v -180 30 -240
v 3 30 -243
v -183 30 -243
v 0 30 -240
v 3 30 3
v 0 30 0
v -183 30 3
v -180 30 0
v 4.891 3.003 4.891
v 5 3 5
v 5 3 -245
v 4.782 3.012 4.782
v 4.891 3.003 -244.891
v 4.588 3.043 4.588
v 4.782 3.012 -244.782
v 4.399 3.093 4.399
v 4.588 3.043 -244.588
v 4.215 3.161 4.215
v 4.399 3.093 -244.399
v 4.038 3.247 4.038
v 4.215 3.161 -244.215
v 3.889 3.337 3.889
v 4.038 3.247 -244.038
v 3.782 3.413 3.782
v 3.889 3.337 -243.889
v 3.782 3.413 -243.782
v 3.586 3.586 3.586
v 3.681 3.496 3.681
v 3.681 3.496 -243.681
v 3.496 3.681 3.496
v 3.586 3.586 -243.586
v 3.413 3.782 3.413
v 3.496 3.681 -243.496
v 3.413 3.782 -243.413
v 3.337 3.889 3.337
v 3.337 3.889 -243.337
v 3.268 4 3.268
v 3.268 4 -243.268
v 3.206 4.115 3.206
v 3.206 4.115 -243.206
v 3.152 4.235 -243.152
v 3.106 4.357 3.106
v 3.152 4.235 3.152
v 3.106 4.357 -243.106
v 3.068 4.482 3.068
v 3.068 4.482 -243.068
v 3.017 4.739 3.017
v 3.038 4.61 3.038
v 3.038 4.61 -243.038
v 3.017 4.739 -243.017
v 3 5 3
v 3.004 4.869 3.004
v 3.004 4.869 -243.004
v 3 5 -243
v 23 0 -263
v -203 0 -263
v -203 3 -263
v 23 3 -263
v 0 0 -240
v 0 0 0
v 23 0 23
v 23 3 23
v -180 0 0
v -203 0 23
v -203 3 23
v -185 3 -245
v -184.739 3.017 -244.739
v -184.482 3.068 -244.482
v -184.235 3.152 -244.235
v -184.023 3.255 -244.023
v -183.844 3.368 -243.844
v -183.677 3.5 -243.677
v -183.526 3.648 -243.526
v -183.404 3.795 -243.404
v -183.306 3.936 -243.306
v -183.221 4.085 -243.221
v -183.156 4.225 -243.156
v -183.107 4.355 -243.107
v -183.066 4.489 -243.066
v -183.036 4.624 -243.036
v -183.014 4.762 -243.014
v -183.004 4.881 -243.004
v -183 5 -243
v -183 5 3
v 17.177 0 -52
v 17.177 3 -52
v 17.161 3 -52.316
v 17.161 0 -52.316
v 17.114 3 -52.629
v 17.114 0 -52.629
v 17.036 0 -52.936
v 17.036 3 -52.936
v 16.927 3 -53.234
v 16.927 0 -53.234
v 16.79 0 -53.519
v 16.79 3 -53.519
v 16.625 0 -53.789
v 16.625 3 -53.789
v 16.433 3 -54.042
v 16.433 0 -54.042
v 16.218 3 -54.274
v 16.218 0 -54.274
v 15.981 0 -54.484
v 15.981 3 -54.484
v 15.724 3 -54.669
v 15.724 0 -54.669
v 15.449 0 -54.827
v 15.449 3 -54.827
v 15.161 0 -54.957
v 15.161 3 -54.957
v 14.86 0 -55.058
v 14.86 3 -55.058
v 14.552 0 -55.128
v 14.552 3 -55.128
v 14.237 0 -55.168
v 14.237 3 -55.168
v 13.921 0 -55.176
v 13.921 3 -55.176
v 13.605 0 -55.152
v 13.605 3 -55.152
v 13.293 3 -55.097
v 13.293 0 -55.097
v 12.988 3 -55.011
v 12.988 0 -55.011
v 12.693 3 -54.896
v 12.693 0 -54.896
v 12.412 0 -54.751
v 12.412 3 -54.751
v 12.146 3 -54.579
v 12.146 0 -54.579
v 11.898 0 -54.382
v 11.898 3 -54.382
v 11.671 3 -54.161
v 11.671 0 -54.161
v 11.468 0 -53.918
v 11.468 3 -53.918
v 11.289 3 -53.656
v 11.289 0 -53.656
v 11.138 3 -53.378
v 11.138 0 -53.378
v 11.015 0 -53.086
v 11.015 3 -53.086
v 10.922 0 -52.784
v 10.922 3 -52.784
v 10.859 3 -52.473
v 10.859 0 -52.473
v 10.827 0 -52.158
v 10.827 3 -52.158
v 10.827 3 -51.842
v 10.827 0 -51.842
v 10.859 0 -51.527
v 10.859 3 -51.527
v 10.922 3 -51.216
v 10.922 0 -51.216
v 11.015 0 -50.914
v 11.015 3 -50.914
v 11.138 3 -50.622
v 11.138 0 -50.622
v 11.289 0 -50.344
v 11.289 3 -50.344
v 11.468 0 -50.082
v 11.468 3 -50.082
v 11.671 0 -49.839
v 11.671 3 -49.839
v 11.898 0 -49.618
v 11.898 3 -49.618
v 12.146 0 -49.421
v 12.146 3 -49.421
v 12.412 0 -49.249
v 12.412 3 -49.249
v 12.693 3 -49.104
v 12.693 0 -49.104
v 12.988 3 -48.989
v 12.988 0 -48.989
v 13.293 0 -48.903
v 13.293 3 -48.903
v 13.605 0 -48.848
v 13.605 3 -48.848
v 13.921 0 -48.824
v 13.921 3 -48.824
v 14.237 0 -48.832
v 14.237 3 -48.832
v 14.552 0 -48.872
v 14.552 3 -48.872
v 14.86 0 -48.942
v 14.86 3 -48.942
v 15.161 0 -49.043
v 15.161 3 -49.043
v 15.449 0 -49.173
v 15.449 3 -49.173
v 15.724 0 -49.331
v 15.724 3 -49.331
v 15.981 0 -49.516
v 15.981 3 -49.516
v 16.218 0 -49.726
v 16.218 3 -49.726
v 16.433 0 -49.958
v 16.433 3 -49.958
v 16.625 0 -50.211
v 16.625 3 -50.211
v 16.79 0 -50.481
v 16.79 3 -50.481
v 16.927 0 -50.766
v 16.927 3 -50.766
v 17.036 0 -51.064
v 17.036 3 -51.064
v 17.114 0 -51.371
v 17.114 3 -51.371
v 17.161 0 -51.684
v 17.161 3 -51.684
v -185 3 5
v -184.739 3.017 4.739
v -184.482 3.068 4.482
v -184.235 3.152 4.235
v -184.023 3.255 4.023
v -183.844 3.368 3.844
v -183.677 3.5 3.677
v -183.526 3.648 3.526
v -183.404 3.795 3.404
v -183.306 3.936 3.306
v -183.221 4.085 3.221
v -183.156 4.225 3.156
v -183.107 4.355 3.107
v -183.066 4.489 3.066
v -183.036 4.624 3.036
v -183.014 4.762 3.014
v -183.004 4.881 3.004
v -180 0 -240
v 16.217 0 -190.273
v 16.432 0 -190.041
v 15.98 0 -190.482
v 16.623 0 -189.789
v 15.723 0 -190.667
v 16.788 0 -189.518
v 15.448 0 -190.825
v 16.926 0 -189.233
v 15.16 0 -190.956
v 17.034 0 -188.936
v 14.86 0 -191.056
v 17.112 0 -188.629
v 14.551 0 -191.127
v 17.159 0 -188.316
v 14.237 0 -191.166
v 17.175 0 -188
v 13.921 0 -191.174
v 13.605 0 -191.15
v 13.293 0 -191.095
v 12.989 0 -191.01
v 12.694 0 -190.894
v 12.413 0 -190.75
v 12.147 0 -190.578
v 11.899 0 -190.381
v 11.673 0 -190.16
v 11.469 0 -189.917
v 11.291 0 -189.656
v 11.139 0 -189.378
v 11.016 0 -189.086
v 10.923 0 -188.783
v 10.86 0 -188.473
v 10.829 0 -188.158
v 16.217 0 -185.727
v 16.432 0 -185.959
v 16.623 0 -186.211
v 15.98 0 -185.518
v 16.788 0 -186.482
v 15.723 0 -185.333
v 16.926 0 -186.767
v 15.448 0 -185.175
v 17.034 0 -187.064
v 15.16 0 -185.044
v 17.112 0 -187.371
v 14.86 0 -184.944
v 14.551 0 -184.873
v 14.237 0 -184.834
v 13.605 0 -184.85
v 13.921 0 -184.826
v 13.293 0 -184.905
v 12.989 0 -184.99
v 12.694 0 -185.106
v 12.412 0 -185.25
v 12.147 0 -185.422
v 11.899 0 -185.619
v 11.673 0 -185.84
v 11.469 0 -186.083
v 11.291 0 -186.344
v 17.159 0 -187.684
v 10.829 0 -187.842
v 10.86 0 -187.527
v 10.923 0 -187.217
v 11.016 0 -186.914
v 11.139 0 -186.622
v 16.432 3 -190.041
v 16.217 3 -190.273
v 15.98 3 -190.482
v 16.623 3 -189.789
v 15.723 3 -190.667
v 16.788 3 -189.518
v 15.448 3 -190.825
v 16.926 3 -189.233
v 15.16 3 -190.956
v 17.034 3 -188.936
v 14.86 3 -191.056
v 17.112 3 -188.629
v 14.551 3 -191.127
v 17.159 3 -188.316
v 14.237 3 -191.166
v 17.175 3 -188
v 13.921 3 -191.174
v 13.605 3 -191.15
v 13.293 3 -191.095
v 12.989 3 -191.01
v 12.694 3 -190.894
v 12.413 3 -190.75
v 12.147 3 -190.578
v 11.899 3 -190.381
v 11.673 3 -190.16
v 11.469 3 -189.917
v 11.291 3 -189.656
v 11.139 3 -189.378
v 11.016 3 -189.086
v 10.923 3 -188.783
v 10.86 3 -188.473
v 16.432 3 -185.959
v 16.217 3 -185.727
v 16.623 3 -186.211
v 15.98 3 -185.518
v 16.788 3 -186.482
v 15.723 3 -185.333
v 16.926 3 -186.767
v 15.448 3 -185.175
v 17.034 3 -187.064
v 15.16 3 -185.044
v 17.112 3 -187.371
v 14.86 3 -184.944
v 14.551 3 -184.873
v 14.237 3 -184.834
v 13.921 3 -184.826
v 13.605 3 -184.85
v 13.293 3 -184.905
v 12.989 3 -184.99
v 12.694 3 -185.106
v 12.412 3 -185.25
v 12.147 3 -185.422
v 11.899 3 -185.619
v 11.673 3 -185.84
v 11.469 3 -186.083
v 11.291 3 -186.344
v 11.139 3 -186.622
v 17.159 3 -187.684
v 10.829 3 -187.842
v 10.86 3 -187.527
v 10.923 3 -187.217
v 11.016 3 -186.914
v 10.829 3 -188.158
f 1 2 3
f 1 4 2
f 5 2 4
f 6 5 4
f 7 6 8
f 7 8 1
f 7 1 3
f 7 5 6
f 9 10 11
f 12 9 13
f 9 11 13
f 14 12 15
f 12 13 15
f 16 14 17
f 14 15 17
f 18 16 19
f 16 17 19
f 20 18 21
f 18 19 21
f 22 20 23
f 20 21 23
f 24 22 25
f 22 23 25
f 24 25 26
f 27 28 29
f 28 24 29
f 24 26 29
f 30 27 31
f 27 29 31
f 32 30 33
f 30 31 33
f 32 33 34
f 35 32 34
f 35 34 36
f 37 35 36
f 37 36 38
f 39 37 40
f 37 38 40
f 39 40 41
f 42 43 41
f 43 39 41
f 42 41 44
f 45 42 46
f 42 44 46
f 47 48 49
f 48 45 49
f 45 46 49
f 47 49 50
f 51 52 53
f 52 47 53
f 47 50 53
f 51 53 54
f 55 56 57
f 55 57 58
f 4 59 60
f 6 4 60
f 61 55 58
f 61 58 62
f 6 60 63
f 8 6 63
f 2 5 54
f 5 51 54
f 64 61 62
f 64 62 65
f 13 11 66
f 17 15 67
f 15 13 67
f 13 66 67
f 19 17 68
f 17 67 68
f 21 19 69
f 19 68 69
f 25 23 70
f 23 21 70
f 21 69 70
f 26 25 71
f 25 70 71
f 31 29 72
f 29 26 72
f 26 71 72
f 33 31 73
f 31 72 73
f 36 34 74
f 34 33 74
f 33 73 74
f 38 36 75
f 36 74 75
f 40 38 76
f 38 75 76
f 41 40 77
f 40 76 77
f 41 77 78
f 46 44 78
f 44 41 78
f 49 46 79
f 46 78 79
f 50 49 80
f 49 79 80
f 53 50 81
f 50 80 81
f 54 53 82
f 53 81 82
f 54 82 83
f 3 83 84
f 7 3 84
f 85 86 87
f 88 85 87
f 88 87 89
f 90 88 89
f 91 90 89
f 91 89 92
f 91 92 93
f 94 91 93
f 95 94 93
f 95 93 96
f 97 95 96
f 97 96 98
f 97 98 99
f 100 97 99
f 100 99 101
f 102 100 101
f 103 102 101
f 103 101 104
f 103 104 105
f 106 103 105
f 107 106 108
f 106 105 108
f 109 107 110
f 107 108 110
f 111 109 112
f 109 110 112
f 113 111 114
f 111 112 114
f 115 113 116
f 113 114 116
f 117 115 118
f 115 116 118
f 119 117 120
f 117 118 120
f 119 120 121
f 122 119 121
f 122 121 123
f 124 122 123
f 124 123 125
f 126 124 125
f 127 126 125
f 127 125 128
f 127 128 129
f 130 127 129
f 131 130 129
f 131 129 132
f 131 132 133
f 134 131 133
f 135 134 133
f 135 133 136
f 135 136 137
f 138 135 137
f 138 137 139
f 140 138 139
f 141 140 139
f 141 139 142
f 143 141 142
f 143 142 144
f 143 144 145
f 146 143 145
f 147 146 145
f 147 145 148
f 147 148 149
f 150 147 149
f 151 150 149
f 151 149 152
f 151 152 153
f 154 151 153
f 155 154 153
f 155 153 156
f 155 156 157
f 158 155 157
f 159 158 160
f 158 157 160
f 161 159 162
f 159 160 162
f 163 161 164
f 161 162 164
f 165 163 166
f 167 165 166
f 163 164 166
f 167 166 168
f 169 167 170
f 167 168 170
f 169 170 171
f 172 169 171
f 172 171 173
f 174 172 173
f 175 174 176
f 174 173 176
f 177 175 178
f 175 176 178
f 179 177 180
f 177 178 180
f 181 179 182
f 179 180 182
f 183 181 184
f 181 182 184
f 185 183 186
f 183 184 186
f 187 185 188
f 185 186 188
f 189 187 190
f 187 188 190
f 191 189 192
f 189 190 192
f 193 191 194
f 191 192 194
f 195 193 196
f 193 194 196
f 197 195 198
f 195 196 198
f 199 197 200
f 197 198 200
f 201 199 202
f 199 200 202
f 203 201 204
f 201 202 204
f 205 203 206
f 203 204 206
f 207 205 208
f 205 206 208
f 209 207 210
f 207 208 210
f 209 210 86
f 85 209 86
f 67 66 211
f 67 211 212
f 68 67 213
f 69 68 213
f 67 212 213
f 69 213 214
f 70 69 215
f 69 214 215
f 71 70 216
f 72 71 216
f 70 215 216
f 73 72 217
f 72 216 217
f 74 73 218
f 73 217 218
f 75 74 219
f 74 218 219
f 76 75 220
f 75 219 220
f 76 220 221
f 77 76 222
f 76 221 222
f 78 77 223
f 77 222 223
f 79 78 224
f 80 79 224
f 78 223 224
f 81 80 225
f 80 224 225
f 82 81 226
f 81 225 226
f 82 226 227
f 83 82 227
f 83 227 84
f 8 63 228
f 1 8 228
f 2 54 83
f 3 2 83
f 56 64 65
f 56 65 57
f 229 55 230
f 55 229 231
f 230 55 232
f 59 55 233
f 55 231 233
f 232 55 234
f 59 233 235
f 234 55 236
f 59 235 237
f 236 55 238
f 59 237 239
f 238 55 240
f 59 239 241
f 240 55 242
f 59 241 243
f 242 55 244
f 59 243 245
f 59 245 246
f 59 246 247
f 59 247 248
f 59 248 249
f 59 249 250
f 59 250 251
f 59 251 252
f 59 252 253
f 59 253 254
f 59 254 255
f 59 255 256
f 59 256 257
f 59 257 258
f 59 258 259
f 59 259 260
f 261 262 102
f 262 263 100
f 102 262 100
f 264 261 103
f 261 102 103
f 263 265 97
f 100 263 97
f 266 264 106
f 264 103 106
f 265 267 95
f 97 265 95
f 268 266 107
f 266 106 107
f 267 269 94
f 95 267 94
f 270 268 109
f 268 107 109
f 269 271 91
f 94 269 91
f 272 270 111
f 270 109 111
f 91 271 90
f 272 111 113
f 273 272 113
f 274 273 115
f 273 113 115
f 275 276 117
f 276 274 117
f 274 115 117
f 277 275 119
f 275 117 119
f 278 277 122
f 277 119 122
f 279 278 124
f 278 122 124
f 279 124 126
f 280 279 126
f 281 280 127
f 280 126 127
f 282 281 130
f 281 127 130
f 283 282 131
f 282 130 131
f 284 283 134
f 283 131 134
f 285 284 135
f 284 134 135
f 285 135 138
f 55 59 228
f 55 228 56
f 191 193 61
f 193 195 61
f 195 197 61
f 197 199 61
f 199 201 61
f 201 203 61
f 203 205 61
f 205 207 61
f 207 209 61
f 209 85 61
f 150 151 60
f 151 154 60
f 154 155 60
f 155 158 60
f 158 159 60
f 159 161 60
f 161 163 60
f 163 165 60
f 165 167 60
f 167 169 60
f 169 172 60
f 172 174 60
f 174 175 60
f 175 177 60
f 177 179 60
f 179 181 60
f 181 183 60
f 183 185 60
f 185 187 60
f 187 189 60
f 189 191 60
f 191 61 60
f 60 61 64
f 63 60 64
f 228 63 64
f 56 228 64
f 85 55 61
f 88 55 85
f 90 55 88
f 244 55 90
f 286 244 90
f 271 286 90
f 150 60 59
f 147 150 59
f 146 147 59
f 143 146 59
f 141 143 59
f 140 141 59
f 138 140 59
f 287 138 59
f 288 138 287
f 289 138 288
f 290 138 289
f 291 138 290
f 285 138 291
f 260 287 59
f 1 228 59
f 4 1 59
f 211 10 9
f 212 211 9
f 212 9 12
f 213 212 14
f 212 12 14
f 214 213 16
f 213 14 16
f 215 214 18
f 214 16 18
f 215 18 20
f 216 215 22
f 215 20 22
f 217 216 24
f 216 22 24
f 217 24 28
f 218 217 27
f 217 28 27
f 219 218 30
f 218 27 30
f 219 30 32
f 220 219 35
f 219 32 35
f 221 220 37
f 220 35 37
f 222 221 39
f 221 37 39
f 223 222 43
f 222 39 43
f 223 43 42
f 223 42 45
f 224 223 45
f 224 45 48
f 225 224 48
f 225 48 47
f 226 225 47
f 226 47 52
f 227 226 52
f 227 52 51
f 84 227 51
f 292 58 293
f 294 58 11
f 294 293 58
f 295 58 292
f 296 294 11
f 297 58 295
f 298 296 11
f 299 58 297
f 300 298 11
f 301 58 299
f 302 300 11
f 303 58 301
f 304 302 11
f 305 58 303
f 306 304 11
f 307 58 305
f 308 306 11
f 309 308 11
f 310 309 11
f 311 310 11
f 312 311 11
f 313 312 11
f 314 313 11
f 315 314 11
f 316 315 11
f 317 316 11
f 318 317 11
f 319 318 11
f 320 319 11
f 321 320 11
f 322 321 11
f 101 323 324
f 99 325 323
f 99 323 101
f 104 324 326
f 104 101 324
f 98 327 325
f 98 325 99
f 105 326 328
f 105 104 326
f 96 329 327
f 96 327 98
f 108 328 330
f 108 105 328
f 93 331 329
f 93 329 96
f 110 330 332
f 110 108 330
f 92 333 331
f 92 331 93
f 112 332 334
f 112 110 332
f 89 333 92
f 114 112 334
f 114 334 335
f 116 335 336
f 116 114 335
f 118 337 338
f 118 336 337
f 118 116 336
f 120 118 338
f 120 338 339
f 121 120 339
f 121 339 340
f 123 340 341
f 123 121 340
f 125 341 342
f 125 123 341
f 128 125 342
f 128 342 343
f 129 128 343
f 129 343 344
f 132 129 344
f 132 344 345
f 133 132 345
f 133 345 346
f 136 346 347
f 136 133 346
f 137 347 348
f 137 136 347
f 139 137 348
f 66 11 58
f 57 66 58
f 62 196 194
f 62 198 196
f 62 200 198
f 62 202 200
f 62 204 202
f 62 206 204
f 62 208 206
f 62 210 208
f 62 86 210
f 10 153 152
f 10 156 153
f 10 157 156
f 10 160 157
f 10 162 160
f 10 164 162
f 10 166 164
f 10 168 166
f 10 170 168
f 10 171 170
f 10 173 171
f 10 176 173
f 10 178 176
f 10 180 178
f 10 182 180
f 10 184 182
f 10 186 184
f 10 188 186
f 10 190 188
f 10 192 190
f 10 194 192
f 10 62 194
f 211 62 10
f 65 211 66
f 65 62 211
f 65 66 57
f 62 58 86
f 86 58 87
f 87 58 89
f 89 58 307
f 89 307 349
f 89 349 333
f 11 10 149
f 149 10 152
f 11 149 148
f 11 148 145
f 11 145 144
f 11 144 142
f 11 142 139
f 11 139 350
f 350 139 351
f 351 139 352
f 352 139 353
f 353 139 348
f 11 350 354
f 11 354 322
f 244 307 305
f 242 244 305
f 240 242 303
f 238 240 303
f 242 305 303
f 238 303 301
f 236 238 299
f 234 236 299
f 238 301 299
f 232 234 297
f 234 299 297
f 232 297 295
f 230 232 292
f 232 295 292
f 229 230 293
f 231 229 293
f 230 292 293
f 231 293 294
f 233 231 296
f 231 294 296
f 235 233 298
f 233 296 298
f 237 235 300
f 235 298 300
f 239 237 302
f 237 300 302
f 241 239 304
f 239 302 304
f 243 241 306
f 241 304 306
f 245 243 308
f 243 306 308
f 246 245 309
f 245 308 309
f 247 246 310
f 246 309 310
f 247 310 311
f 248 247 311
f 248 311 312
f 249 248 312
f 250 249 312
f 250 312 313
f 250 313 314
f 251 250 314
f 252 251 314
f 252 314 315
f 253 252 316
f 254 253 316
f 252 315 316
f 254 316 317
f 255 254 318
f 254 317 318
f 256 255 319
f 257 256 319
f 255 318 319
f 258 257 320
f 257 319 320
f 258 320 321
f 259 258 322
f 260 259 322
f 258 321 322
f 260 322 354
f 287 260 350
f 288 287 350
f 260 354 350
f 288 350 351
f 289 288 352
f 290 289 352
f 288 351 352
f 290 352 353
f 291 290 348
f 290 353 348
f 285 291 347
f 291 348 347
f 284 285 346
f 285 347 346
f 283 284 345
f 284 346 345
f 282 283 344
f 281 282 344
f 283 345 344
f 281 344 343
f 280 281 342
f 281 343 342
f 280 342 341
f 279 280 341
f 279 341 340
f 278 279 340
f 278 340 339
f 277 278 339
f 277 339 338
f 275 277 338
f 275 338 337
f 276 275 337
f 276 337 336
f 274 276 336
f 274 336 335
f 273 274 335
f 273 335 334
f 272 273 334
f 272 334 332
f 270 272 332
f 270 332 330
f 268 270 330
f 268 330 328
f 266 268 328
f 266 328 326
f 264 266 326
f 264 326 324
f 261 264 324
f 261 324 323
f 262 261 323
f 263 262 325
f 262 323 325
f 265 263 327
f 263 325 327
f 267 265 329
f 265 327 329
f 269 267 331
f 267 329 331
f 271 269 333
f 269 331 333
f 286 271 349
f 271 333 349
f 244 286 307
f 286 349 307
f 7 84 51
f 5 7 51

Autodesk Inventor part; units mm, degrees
ref_plane "YZ Plane" through (0, 0, 0) normal (1, 0, 0) x (0, 1, 0)
ref_plane "XZ Plane" through (0, 0, 0) normal (0, 1, 0) x (-1, 0, 0)
ref_plane "XY Plane" through (0, 0, 0) normal (0, 0, 1) x (1, 0, 0)
sketch "Boceto1" plane through (0, 0, 0) normal (0, 1, 0) x (-1, 0, 0)
  line L0 (0, 0) -> (180, 0)
  line L1 (180, 0) -> (180, -240)
  line L2 (180, -240) -> (0, -240)
  line L3 (0, -240) -> (0, 0)
  line L4 (-3, -243) -> (183, -243)
  line L5 (183, -243) -> (183, 3)
  line L6 (183, 3) -> (-3, 3)
  line L7 (-3, 3) -> (-3, -243)
  line L8 (203, 23) -> (203, -263)
  line L9 (203, -263) -> (-23, -263)
  line L10 (-23, -263) -> (-23, 23)
  line L11 (-23, 23) -> (203, 23)
  dimension "d0" = 180
  dimension "d1" = 240
  dimension "d2" = 3
  dimension "d5" = 20
extrude "Extrusión2" add sketch "Boceto1" along normal blind 30 contours L7 L6 L5 L4
extrude "Extrusión3" add sketch "Boceto1" along normal blind 3 contours L8 L9 L10 L11
fillet "Empalme1" radius 2 4 edges at (3, 3, -120) (-90, 3, 3) (-90, 3, -243) (-183, 3, -120)
sketch "Boceto3" plane through (0, 3, 0) normal (0, 1, 0) x (1, 0, 0)
  line L0 (23, -23) -> (23, 263) projected
  line L1 (23, 263) -> (-203, 263) projected
  line L2 (-203, 263) -> (-203, -23) projected
  line L3 (-203, -23) -> (23, -23) projected
  line L4 (-185, -5) -> (5, -5) projected
  line L5 (-185, 245) -> (-185, -5) projected
  line L6 (5, 245) -> (-185, 245) projected
  line L7 (5, -5) -> (5, 245) projected
  line L8 (-203, 263) -> (-203, -23) projected
  line L9 (-203, -23) -> (-203, 2)
  line L10 (-185, 245) -> (-185, -5) projected
  line L11 (-203, 2) -> (-185, 2)
  line L12 (-185, 2) -> (-185, 52)
  line L13 (-185, 52) -> (-203, 52)
  line L14 (-203, 52) -> (-203, 2)
  line L15 (-183, 243) -> (-183, -3) projected
  line L16 (-203, 182) -> (-183, 182)
  line L17 (-183, 182) -> (-183, 232)
  line L18 (-183, 232) -> (-203, 232)
  line L19 (-203, 232) -> (-203, 182)
  line L20 (5, -5) -> (5, 245) projected
  line L21 (23, 207) -> (23, 232)
  line L22 (5, 232) -> (5, 207)
  circle A0 centre (14, 188) radius 3.175
  circle A1 centre (14, 52) radius 3.1767
  point P0 (0, 0)
  point P1 (-193, 182)
  point P2 (-185, 232)
  point P3 (-185, 182)
  dimension "d11" = 25
  dimension "d12" = 50
  dimension "d13" = 50
  dimension "d14" = 130
  dimension "d15" = 6.35
  dimension "d16" = 75
  dimension "d17" = 75
extrude "Extrusión5" cut sketch "Boceto3" against normal blind 3 contours A0 | A1
properties part number "Tapa Superior"
